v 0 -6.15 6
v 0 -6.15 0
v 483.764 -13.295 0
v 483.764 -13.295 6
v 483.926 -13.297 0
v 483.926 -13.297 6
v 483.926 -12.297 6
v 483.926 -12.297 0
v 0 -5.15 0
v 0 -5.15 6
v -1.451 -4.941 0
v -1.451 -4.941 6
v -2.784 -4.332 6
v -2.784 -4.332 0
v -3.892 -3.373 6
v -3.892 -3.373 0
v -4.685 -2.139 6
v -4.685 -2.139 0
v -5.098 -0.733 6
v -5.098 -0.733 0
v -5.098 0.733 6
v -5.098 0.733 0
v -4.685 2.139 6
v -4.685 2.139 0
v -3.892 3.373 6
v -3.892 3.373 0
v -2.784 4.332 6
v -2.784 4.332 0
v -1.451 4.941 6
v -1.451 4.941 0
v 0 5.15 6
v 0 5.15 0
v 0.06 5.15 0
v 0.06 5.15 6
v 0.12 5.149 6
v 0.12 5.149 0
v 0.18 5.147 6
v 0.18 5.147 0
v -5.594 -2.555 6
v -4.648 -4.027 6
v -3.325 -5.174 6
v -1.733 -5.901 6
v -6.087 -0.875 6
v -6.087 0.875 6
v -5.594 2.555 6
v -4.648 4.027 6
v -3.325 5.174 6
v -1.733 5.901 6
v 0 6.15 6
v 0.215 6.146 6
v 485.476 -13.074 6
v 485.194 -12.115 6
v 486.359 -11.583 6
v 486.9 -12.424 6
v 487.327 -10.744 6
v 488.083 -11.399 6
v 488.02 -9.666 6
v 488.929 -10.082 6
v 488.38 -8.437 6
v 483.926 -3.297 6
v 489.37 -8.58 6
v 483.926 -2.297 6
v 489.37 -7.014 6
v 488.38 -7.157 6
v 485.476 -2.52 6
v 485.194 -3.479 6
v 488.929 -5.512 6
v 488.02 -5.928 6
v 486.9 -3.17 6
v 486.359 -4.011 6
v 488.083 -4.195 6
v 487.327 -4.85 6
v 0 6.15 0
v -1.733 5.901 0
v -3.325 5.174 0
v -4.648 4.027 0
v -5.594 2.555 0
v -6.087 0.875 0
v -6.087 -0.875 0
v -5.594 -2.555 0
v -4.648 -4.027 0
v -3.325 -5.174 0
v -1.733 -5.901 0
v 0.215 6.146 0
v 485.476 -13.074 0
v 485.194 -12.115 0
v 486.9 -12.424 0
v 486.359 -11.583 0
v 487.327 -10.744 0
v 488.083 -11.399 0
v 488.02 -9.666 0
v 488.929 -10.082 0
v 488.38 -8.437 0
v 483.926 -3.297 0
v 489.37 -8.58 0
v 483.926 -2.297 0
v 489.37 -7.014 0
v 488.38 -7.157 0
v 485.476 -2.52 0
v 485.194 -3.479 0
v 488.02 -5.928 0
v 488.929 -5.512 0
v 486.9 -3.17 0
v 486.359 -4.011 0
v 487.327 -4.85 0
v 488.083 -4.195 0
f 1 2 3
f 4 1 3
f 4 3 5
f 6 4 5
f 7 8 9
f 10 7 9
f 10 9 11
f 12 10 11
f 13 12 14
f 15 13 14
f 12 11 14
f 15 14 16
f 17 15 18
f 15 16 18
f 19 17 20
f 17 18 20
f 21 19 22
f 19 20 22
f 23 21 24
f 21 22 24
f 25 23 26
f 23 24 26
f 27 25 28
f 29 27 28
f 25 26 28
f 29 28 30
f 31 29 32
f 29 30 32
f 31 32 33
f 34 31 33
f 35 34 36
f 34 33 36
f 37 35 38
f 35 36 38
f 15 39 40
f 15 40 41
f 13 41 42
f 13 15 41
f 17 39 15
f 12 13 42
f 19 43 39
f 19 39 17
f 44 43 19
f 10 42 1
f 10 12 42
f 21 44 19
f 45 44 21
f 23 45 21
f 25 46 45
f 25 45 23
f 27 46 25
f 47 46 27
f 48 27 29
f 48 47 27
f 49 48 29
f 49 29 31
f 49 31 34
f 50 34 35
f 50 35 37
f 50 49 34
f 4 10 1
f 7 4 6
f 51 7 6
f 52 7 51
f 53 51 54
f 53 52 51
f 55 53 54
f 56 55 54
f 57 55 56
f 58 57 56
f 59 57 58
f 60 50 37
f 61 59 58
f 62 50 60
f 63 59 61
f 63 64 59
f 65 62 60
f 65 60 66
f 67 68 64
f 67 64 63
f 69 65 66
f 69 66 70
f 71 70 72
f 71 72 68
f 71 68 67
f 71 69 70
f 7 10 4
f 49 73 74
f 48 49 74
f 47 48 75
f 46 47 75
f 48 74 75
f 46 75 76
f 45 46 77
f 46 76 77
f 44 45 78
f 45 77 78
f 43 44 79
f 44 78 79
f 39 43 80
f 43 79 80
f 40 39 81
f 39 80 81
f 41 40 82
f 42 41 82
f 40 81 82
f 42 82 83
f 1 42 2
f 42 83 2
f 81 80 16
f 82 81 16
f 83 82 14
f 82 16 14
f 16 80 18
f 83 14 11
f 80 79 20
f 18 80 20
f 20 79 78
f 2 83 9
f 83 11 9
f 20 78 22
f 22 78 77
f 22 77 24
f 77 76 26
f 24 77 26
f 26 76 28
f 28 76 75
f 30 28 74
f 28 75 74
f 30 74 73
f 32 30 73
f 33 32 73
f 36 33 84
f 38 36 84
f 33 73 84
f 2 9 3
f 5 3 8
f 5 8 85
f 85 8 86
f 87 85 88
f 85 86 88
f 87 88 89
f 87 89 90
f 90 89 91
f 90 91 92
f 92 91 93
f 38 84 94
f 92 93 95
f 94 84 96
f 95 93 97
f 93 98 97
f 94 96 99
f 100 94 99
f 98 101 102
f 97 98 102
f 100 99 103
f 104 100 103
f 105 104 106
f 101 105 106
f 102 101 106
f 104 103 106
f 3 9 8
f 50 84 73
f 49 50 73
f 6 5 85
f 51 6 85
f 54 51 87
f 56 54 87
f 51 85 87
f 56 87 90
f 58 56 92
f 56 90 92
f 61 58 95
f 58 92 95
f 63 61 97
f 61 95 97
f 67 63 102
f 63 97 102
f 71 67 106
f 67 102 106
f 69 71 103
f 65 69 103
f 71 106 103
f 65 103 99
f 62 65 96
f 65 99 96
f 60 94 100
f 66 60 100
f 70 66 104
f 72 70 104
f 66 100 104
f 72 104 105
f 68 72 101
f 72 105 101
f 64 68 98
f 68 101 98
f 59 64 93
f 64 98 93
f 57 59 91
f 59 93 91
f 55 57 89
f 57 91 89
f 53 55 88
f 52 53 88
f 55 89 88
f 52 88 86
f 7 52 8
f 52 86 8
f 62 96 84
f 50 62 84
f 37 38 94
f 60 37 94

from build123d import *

# Parameters (mm, degrees)
BOSS_EXTRUDE1_DEPTH = 6


with BuildPart() as part:
    # Sketch1 → Boss-Extrude1 (new body)
    with BuildSketch(Plane.XY):
        with BuildLine():
            ThreePointArc((483.92628469, -13.296951286), (489.42628469, -7.796951286), (483.92628469, -2.296951286))
            Line((483.92628469, -2.296951286), (0.214631564, 6.146253598))
            Line((0.214631564, 6.146253598), (0, 6.15))
            ThreePointArc((0, 6.15), (-6.15, 0), (0, -6.15))
            Line((0, -6.15), (483.763864662, -13.294552557))
            Line((483.763864662, -13.294552557), (483.92628469, -13.296951286))
        make_face()
        with BuildLine():
            ThreePointArc((0, -5.15), (-5.15, 0), (0, 5.15))
            ThreePointArc((0, 5.15), (0.08987975, 5.149215633), (0.179732122, 5.146862769))
            Line((0.179732122, 5.146862769), (483.92628469, -3.296951286))
            ThreePointArc((483.92628469, -3.296951286), (488.42628469, -7.796951286), (483.92628469, -12.296951286))
            Line((483.92628469, -12.296951286), (0, -5.15))
        make_face(mode=Mode.SUBTRACT)
    extrude(amount=BOSS_EXTRUDE1_DEPTH)


solid = part.part
